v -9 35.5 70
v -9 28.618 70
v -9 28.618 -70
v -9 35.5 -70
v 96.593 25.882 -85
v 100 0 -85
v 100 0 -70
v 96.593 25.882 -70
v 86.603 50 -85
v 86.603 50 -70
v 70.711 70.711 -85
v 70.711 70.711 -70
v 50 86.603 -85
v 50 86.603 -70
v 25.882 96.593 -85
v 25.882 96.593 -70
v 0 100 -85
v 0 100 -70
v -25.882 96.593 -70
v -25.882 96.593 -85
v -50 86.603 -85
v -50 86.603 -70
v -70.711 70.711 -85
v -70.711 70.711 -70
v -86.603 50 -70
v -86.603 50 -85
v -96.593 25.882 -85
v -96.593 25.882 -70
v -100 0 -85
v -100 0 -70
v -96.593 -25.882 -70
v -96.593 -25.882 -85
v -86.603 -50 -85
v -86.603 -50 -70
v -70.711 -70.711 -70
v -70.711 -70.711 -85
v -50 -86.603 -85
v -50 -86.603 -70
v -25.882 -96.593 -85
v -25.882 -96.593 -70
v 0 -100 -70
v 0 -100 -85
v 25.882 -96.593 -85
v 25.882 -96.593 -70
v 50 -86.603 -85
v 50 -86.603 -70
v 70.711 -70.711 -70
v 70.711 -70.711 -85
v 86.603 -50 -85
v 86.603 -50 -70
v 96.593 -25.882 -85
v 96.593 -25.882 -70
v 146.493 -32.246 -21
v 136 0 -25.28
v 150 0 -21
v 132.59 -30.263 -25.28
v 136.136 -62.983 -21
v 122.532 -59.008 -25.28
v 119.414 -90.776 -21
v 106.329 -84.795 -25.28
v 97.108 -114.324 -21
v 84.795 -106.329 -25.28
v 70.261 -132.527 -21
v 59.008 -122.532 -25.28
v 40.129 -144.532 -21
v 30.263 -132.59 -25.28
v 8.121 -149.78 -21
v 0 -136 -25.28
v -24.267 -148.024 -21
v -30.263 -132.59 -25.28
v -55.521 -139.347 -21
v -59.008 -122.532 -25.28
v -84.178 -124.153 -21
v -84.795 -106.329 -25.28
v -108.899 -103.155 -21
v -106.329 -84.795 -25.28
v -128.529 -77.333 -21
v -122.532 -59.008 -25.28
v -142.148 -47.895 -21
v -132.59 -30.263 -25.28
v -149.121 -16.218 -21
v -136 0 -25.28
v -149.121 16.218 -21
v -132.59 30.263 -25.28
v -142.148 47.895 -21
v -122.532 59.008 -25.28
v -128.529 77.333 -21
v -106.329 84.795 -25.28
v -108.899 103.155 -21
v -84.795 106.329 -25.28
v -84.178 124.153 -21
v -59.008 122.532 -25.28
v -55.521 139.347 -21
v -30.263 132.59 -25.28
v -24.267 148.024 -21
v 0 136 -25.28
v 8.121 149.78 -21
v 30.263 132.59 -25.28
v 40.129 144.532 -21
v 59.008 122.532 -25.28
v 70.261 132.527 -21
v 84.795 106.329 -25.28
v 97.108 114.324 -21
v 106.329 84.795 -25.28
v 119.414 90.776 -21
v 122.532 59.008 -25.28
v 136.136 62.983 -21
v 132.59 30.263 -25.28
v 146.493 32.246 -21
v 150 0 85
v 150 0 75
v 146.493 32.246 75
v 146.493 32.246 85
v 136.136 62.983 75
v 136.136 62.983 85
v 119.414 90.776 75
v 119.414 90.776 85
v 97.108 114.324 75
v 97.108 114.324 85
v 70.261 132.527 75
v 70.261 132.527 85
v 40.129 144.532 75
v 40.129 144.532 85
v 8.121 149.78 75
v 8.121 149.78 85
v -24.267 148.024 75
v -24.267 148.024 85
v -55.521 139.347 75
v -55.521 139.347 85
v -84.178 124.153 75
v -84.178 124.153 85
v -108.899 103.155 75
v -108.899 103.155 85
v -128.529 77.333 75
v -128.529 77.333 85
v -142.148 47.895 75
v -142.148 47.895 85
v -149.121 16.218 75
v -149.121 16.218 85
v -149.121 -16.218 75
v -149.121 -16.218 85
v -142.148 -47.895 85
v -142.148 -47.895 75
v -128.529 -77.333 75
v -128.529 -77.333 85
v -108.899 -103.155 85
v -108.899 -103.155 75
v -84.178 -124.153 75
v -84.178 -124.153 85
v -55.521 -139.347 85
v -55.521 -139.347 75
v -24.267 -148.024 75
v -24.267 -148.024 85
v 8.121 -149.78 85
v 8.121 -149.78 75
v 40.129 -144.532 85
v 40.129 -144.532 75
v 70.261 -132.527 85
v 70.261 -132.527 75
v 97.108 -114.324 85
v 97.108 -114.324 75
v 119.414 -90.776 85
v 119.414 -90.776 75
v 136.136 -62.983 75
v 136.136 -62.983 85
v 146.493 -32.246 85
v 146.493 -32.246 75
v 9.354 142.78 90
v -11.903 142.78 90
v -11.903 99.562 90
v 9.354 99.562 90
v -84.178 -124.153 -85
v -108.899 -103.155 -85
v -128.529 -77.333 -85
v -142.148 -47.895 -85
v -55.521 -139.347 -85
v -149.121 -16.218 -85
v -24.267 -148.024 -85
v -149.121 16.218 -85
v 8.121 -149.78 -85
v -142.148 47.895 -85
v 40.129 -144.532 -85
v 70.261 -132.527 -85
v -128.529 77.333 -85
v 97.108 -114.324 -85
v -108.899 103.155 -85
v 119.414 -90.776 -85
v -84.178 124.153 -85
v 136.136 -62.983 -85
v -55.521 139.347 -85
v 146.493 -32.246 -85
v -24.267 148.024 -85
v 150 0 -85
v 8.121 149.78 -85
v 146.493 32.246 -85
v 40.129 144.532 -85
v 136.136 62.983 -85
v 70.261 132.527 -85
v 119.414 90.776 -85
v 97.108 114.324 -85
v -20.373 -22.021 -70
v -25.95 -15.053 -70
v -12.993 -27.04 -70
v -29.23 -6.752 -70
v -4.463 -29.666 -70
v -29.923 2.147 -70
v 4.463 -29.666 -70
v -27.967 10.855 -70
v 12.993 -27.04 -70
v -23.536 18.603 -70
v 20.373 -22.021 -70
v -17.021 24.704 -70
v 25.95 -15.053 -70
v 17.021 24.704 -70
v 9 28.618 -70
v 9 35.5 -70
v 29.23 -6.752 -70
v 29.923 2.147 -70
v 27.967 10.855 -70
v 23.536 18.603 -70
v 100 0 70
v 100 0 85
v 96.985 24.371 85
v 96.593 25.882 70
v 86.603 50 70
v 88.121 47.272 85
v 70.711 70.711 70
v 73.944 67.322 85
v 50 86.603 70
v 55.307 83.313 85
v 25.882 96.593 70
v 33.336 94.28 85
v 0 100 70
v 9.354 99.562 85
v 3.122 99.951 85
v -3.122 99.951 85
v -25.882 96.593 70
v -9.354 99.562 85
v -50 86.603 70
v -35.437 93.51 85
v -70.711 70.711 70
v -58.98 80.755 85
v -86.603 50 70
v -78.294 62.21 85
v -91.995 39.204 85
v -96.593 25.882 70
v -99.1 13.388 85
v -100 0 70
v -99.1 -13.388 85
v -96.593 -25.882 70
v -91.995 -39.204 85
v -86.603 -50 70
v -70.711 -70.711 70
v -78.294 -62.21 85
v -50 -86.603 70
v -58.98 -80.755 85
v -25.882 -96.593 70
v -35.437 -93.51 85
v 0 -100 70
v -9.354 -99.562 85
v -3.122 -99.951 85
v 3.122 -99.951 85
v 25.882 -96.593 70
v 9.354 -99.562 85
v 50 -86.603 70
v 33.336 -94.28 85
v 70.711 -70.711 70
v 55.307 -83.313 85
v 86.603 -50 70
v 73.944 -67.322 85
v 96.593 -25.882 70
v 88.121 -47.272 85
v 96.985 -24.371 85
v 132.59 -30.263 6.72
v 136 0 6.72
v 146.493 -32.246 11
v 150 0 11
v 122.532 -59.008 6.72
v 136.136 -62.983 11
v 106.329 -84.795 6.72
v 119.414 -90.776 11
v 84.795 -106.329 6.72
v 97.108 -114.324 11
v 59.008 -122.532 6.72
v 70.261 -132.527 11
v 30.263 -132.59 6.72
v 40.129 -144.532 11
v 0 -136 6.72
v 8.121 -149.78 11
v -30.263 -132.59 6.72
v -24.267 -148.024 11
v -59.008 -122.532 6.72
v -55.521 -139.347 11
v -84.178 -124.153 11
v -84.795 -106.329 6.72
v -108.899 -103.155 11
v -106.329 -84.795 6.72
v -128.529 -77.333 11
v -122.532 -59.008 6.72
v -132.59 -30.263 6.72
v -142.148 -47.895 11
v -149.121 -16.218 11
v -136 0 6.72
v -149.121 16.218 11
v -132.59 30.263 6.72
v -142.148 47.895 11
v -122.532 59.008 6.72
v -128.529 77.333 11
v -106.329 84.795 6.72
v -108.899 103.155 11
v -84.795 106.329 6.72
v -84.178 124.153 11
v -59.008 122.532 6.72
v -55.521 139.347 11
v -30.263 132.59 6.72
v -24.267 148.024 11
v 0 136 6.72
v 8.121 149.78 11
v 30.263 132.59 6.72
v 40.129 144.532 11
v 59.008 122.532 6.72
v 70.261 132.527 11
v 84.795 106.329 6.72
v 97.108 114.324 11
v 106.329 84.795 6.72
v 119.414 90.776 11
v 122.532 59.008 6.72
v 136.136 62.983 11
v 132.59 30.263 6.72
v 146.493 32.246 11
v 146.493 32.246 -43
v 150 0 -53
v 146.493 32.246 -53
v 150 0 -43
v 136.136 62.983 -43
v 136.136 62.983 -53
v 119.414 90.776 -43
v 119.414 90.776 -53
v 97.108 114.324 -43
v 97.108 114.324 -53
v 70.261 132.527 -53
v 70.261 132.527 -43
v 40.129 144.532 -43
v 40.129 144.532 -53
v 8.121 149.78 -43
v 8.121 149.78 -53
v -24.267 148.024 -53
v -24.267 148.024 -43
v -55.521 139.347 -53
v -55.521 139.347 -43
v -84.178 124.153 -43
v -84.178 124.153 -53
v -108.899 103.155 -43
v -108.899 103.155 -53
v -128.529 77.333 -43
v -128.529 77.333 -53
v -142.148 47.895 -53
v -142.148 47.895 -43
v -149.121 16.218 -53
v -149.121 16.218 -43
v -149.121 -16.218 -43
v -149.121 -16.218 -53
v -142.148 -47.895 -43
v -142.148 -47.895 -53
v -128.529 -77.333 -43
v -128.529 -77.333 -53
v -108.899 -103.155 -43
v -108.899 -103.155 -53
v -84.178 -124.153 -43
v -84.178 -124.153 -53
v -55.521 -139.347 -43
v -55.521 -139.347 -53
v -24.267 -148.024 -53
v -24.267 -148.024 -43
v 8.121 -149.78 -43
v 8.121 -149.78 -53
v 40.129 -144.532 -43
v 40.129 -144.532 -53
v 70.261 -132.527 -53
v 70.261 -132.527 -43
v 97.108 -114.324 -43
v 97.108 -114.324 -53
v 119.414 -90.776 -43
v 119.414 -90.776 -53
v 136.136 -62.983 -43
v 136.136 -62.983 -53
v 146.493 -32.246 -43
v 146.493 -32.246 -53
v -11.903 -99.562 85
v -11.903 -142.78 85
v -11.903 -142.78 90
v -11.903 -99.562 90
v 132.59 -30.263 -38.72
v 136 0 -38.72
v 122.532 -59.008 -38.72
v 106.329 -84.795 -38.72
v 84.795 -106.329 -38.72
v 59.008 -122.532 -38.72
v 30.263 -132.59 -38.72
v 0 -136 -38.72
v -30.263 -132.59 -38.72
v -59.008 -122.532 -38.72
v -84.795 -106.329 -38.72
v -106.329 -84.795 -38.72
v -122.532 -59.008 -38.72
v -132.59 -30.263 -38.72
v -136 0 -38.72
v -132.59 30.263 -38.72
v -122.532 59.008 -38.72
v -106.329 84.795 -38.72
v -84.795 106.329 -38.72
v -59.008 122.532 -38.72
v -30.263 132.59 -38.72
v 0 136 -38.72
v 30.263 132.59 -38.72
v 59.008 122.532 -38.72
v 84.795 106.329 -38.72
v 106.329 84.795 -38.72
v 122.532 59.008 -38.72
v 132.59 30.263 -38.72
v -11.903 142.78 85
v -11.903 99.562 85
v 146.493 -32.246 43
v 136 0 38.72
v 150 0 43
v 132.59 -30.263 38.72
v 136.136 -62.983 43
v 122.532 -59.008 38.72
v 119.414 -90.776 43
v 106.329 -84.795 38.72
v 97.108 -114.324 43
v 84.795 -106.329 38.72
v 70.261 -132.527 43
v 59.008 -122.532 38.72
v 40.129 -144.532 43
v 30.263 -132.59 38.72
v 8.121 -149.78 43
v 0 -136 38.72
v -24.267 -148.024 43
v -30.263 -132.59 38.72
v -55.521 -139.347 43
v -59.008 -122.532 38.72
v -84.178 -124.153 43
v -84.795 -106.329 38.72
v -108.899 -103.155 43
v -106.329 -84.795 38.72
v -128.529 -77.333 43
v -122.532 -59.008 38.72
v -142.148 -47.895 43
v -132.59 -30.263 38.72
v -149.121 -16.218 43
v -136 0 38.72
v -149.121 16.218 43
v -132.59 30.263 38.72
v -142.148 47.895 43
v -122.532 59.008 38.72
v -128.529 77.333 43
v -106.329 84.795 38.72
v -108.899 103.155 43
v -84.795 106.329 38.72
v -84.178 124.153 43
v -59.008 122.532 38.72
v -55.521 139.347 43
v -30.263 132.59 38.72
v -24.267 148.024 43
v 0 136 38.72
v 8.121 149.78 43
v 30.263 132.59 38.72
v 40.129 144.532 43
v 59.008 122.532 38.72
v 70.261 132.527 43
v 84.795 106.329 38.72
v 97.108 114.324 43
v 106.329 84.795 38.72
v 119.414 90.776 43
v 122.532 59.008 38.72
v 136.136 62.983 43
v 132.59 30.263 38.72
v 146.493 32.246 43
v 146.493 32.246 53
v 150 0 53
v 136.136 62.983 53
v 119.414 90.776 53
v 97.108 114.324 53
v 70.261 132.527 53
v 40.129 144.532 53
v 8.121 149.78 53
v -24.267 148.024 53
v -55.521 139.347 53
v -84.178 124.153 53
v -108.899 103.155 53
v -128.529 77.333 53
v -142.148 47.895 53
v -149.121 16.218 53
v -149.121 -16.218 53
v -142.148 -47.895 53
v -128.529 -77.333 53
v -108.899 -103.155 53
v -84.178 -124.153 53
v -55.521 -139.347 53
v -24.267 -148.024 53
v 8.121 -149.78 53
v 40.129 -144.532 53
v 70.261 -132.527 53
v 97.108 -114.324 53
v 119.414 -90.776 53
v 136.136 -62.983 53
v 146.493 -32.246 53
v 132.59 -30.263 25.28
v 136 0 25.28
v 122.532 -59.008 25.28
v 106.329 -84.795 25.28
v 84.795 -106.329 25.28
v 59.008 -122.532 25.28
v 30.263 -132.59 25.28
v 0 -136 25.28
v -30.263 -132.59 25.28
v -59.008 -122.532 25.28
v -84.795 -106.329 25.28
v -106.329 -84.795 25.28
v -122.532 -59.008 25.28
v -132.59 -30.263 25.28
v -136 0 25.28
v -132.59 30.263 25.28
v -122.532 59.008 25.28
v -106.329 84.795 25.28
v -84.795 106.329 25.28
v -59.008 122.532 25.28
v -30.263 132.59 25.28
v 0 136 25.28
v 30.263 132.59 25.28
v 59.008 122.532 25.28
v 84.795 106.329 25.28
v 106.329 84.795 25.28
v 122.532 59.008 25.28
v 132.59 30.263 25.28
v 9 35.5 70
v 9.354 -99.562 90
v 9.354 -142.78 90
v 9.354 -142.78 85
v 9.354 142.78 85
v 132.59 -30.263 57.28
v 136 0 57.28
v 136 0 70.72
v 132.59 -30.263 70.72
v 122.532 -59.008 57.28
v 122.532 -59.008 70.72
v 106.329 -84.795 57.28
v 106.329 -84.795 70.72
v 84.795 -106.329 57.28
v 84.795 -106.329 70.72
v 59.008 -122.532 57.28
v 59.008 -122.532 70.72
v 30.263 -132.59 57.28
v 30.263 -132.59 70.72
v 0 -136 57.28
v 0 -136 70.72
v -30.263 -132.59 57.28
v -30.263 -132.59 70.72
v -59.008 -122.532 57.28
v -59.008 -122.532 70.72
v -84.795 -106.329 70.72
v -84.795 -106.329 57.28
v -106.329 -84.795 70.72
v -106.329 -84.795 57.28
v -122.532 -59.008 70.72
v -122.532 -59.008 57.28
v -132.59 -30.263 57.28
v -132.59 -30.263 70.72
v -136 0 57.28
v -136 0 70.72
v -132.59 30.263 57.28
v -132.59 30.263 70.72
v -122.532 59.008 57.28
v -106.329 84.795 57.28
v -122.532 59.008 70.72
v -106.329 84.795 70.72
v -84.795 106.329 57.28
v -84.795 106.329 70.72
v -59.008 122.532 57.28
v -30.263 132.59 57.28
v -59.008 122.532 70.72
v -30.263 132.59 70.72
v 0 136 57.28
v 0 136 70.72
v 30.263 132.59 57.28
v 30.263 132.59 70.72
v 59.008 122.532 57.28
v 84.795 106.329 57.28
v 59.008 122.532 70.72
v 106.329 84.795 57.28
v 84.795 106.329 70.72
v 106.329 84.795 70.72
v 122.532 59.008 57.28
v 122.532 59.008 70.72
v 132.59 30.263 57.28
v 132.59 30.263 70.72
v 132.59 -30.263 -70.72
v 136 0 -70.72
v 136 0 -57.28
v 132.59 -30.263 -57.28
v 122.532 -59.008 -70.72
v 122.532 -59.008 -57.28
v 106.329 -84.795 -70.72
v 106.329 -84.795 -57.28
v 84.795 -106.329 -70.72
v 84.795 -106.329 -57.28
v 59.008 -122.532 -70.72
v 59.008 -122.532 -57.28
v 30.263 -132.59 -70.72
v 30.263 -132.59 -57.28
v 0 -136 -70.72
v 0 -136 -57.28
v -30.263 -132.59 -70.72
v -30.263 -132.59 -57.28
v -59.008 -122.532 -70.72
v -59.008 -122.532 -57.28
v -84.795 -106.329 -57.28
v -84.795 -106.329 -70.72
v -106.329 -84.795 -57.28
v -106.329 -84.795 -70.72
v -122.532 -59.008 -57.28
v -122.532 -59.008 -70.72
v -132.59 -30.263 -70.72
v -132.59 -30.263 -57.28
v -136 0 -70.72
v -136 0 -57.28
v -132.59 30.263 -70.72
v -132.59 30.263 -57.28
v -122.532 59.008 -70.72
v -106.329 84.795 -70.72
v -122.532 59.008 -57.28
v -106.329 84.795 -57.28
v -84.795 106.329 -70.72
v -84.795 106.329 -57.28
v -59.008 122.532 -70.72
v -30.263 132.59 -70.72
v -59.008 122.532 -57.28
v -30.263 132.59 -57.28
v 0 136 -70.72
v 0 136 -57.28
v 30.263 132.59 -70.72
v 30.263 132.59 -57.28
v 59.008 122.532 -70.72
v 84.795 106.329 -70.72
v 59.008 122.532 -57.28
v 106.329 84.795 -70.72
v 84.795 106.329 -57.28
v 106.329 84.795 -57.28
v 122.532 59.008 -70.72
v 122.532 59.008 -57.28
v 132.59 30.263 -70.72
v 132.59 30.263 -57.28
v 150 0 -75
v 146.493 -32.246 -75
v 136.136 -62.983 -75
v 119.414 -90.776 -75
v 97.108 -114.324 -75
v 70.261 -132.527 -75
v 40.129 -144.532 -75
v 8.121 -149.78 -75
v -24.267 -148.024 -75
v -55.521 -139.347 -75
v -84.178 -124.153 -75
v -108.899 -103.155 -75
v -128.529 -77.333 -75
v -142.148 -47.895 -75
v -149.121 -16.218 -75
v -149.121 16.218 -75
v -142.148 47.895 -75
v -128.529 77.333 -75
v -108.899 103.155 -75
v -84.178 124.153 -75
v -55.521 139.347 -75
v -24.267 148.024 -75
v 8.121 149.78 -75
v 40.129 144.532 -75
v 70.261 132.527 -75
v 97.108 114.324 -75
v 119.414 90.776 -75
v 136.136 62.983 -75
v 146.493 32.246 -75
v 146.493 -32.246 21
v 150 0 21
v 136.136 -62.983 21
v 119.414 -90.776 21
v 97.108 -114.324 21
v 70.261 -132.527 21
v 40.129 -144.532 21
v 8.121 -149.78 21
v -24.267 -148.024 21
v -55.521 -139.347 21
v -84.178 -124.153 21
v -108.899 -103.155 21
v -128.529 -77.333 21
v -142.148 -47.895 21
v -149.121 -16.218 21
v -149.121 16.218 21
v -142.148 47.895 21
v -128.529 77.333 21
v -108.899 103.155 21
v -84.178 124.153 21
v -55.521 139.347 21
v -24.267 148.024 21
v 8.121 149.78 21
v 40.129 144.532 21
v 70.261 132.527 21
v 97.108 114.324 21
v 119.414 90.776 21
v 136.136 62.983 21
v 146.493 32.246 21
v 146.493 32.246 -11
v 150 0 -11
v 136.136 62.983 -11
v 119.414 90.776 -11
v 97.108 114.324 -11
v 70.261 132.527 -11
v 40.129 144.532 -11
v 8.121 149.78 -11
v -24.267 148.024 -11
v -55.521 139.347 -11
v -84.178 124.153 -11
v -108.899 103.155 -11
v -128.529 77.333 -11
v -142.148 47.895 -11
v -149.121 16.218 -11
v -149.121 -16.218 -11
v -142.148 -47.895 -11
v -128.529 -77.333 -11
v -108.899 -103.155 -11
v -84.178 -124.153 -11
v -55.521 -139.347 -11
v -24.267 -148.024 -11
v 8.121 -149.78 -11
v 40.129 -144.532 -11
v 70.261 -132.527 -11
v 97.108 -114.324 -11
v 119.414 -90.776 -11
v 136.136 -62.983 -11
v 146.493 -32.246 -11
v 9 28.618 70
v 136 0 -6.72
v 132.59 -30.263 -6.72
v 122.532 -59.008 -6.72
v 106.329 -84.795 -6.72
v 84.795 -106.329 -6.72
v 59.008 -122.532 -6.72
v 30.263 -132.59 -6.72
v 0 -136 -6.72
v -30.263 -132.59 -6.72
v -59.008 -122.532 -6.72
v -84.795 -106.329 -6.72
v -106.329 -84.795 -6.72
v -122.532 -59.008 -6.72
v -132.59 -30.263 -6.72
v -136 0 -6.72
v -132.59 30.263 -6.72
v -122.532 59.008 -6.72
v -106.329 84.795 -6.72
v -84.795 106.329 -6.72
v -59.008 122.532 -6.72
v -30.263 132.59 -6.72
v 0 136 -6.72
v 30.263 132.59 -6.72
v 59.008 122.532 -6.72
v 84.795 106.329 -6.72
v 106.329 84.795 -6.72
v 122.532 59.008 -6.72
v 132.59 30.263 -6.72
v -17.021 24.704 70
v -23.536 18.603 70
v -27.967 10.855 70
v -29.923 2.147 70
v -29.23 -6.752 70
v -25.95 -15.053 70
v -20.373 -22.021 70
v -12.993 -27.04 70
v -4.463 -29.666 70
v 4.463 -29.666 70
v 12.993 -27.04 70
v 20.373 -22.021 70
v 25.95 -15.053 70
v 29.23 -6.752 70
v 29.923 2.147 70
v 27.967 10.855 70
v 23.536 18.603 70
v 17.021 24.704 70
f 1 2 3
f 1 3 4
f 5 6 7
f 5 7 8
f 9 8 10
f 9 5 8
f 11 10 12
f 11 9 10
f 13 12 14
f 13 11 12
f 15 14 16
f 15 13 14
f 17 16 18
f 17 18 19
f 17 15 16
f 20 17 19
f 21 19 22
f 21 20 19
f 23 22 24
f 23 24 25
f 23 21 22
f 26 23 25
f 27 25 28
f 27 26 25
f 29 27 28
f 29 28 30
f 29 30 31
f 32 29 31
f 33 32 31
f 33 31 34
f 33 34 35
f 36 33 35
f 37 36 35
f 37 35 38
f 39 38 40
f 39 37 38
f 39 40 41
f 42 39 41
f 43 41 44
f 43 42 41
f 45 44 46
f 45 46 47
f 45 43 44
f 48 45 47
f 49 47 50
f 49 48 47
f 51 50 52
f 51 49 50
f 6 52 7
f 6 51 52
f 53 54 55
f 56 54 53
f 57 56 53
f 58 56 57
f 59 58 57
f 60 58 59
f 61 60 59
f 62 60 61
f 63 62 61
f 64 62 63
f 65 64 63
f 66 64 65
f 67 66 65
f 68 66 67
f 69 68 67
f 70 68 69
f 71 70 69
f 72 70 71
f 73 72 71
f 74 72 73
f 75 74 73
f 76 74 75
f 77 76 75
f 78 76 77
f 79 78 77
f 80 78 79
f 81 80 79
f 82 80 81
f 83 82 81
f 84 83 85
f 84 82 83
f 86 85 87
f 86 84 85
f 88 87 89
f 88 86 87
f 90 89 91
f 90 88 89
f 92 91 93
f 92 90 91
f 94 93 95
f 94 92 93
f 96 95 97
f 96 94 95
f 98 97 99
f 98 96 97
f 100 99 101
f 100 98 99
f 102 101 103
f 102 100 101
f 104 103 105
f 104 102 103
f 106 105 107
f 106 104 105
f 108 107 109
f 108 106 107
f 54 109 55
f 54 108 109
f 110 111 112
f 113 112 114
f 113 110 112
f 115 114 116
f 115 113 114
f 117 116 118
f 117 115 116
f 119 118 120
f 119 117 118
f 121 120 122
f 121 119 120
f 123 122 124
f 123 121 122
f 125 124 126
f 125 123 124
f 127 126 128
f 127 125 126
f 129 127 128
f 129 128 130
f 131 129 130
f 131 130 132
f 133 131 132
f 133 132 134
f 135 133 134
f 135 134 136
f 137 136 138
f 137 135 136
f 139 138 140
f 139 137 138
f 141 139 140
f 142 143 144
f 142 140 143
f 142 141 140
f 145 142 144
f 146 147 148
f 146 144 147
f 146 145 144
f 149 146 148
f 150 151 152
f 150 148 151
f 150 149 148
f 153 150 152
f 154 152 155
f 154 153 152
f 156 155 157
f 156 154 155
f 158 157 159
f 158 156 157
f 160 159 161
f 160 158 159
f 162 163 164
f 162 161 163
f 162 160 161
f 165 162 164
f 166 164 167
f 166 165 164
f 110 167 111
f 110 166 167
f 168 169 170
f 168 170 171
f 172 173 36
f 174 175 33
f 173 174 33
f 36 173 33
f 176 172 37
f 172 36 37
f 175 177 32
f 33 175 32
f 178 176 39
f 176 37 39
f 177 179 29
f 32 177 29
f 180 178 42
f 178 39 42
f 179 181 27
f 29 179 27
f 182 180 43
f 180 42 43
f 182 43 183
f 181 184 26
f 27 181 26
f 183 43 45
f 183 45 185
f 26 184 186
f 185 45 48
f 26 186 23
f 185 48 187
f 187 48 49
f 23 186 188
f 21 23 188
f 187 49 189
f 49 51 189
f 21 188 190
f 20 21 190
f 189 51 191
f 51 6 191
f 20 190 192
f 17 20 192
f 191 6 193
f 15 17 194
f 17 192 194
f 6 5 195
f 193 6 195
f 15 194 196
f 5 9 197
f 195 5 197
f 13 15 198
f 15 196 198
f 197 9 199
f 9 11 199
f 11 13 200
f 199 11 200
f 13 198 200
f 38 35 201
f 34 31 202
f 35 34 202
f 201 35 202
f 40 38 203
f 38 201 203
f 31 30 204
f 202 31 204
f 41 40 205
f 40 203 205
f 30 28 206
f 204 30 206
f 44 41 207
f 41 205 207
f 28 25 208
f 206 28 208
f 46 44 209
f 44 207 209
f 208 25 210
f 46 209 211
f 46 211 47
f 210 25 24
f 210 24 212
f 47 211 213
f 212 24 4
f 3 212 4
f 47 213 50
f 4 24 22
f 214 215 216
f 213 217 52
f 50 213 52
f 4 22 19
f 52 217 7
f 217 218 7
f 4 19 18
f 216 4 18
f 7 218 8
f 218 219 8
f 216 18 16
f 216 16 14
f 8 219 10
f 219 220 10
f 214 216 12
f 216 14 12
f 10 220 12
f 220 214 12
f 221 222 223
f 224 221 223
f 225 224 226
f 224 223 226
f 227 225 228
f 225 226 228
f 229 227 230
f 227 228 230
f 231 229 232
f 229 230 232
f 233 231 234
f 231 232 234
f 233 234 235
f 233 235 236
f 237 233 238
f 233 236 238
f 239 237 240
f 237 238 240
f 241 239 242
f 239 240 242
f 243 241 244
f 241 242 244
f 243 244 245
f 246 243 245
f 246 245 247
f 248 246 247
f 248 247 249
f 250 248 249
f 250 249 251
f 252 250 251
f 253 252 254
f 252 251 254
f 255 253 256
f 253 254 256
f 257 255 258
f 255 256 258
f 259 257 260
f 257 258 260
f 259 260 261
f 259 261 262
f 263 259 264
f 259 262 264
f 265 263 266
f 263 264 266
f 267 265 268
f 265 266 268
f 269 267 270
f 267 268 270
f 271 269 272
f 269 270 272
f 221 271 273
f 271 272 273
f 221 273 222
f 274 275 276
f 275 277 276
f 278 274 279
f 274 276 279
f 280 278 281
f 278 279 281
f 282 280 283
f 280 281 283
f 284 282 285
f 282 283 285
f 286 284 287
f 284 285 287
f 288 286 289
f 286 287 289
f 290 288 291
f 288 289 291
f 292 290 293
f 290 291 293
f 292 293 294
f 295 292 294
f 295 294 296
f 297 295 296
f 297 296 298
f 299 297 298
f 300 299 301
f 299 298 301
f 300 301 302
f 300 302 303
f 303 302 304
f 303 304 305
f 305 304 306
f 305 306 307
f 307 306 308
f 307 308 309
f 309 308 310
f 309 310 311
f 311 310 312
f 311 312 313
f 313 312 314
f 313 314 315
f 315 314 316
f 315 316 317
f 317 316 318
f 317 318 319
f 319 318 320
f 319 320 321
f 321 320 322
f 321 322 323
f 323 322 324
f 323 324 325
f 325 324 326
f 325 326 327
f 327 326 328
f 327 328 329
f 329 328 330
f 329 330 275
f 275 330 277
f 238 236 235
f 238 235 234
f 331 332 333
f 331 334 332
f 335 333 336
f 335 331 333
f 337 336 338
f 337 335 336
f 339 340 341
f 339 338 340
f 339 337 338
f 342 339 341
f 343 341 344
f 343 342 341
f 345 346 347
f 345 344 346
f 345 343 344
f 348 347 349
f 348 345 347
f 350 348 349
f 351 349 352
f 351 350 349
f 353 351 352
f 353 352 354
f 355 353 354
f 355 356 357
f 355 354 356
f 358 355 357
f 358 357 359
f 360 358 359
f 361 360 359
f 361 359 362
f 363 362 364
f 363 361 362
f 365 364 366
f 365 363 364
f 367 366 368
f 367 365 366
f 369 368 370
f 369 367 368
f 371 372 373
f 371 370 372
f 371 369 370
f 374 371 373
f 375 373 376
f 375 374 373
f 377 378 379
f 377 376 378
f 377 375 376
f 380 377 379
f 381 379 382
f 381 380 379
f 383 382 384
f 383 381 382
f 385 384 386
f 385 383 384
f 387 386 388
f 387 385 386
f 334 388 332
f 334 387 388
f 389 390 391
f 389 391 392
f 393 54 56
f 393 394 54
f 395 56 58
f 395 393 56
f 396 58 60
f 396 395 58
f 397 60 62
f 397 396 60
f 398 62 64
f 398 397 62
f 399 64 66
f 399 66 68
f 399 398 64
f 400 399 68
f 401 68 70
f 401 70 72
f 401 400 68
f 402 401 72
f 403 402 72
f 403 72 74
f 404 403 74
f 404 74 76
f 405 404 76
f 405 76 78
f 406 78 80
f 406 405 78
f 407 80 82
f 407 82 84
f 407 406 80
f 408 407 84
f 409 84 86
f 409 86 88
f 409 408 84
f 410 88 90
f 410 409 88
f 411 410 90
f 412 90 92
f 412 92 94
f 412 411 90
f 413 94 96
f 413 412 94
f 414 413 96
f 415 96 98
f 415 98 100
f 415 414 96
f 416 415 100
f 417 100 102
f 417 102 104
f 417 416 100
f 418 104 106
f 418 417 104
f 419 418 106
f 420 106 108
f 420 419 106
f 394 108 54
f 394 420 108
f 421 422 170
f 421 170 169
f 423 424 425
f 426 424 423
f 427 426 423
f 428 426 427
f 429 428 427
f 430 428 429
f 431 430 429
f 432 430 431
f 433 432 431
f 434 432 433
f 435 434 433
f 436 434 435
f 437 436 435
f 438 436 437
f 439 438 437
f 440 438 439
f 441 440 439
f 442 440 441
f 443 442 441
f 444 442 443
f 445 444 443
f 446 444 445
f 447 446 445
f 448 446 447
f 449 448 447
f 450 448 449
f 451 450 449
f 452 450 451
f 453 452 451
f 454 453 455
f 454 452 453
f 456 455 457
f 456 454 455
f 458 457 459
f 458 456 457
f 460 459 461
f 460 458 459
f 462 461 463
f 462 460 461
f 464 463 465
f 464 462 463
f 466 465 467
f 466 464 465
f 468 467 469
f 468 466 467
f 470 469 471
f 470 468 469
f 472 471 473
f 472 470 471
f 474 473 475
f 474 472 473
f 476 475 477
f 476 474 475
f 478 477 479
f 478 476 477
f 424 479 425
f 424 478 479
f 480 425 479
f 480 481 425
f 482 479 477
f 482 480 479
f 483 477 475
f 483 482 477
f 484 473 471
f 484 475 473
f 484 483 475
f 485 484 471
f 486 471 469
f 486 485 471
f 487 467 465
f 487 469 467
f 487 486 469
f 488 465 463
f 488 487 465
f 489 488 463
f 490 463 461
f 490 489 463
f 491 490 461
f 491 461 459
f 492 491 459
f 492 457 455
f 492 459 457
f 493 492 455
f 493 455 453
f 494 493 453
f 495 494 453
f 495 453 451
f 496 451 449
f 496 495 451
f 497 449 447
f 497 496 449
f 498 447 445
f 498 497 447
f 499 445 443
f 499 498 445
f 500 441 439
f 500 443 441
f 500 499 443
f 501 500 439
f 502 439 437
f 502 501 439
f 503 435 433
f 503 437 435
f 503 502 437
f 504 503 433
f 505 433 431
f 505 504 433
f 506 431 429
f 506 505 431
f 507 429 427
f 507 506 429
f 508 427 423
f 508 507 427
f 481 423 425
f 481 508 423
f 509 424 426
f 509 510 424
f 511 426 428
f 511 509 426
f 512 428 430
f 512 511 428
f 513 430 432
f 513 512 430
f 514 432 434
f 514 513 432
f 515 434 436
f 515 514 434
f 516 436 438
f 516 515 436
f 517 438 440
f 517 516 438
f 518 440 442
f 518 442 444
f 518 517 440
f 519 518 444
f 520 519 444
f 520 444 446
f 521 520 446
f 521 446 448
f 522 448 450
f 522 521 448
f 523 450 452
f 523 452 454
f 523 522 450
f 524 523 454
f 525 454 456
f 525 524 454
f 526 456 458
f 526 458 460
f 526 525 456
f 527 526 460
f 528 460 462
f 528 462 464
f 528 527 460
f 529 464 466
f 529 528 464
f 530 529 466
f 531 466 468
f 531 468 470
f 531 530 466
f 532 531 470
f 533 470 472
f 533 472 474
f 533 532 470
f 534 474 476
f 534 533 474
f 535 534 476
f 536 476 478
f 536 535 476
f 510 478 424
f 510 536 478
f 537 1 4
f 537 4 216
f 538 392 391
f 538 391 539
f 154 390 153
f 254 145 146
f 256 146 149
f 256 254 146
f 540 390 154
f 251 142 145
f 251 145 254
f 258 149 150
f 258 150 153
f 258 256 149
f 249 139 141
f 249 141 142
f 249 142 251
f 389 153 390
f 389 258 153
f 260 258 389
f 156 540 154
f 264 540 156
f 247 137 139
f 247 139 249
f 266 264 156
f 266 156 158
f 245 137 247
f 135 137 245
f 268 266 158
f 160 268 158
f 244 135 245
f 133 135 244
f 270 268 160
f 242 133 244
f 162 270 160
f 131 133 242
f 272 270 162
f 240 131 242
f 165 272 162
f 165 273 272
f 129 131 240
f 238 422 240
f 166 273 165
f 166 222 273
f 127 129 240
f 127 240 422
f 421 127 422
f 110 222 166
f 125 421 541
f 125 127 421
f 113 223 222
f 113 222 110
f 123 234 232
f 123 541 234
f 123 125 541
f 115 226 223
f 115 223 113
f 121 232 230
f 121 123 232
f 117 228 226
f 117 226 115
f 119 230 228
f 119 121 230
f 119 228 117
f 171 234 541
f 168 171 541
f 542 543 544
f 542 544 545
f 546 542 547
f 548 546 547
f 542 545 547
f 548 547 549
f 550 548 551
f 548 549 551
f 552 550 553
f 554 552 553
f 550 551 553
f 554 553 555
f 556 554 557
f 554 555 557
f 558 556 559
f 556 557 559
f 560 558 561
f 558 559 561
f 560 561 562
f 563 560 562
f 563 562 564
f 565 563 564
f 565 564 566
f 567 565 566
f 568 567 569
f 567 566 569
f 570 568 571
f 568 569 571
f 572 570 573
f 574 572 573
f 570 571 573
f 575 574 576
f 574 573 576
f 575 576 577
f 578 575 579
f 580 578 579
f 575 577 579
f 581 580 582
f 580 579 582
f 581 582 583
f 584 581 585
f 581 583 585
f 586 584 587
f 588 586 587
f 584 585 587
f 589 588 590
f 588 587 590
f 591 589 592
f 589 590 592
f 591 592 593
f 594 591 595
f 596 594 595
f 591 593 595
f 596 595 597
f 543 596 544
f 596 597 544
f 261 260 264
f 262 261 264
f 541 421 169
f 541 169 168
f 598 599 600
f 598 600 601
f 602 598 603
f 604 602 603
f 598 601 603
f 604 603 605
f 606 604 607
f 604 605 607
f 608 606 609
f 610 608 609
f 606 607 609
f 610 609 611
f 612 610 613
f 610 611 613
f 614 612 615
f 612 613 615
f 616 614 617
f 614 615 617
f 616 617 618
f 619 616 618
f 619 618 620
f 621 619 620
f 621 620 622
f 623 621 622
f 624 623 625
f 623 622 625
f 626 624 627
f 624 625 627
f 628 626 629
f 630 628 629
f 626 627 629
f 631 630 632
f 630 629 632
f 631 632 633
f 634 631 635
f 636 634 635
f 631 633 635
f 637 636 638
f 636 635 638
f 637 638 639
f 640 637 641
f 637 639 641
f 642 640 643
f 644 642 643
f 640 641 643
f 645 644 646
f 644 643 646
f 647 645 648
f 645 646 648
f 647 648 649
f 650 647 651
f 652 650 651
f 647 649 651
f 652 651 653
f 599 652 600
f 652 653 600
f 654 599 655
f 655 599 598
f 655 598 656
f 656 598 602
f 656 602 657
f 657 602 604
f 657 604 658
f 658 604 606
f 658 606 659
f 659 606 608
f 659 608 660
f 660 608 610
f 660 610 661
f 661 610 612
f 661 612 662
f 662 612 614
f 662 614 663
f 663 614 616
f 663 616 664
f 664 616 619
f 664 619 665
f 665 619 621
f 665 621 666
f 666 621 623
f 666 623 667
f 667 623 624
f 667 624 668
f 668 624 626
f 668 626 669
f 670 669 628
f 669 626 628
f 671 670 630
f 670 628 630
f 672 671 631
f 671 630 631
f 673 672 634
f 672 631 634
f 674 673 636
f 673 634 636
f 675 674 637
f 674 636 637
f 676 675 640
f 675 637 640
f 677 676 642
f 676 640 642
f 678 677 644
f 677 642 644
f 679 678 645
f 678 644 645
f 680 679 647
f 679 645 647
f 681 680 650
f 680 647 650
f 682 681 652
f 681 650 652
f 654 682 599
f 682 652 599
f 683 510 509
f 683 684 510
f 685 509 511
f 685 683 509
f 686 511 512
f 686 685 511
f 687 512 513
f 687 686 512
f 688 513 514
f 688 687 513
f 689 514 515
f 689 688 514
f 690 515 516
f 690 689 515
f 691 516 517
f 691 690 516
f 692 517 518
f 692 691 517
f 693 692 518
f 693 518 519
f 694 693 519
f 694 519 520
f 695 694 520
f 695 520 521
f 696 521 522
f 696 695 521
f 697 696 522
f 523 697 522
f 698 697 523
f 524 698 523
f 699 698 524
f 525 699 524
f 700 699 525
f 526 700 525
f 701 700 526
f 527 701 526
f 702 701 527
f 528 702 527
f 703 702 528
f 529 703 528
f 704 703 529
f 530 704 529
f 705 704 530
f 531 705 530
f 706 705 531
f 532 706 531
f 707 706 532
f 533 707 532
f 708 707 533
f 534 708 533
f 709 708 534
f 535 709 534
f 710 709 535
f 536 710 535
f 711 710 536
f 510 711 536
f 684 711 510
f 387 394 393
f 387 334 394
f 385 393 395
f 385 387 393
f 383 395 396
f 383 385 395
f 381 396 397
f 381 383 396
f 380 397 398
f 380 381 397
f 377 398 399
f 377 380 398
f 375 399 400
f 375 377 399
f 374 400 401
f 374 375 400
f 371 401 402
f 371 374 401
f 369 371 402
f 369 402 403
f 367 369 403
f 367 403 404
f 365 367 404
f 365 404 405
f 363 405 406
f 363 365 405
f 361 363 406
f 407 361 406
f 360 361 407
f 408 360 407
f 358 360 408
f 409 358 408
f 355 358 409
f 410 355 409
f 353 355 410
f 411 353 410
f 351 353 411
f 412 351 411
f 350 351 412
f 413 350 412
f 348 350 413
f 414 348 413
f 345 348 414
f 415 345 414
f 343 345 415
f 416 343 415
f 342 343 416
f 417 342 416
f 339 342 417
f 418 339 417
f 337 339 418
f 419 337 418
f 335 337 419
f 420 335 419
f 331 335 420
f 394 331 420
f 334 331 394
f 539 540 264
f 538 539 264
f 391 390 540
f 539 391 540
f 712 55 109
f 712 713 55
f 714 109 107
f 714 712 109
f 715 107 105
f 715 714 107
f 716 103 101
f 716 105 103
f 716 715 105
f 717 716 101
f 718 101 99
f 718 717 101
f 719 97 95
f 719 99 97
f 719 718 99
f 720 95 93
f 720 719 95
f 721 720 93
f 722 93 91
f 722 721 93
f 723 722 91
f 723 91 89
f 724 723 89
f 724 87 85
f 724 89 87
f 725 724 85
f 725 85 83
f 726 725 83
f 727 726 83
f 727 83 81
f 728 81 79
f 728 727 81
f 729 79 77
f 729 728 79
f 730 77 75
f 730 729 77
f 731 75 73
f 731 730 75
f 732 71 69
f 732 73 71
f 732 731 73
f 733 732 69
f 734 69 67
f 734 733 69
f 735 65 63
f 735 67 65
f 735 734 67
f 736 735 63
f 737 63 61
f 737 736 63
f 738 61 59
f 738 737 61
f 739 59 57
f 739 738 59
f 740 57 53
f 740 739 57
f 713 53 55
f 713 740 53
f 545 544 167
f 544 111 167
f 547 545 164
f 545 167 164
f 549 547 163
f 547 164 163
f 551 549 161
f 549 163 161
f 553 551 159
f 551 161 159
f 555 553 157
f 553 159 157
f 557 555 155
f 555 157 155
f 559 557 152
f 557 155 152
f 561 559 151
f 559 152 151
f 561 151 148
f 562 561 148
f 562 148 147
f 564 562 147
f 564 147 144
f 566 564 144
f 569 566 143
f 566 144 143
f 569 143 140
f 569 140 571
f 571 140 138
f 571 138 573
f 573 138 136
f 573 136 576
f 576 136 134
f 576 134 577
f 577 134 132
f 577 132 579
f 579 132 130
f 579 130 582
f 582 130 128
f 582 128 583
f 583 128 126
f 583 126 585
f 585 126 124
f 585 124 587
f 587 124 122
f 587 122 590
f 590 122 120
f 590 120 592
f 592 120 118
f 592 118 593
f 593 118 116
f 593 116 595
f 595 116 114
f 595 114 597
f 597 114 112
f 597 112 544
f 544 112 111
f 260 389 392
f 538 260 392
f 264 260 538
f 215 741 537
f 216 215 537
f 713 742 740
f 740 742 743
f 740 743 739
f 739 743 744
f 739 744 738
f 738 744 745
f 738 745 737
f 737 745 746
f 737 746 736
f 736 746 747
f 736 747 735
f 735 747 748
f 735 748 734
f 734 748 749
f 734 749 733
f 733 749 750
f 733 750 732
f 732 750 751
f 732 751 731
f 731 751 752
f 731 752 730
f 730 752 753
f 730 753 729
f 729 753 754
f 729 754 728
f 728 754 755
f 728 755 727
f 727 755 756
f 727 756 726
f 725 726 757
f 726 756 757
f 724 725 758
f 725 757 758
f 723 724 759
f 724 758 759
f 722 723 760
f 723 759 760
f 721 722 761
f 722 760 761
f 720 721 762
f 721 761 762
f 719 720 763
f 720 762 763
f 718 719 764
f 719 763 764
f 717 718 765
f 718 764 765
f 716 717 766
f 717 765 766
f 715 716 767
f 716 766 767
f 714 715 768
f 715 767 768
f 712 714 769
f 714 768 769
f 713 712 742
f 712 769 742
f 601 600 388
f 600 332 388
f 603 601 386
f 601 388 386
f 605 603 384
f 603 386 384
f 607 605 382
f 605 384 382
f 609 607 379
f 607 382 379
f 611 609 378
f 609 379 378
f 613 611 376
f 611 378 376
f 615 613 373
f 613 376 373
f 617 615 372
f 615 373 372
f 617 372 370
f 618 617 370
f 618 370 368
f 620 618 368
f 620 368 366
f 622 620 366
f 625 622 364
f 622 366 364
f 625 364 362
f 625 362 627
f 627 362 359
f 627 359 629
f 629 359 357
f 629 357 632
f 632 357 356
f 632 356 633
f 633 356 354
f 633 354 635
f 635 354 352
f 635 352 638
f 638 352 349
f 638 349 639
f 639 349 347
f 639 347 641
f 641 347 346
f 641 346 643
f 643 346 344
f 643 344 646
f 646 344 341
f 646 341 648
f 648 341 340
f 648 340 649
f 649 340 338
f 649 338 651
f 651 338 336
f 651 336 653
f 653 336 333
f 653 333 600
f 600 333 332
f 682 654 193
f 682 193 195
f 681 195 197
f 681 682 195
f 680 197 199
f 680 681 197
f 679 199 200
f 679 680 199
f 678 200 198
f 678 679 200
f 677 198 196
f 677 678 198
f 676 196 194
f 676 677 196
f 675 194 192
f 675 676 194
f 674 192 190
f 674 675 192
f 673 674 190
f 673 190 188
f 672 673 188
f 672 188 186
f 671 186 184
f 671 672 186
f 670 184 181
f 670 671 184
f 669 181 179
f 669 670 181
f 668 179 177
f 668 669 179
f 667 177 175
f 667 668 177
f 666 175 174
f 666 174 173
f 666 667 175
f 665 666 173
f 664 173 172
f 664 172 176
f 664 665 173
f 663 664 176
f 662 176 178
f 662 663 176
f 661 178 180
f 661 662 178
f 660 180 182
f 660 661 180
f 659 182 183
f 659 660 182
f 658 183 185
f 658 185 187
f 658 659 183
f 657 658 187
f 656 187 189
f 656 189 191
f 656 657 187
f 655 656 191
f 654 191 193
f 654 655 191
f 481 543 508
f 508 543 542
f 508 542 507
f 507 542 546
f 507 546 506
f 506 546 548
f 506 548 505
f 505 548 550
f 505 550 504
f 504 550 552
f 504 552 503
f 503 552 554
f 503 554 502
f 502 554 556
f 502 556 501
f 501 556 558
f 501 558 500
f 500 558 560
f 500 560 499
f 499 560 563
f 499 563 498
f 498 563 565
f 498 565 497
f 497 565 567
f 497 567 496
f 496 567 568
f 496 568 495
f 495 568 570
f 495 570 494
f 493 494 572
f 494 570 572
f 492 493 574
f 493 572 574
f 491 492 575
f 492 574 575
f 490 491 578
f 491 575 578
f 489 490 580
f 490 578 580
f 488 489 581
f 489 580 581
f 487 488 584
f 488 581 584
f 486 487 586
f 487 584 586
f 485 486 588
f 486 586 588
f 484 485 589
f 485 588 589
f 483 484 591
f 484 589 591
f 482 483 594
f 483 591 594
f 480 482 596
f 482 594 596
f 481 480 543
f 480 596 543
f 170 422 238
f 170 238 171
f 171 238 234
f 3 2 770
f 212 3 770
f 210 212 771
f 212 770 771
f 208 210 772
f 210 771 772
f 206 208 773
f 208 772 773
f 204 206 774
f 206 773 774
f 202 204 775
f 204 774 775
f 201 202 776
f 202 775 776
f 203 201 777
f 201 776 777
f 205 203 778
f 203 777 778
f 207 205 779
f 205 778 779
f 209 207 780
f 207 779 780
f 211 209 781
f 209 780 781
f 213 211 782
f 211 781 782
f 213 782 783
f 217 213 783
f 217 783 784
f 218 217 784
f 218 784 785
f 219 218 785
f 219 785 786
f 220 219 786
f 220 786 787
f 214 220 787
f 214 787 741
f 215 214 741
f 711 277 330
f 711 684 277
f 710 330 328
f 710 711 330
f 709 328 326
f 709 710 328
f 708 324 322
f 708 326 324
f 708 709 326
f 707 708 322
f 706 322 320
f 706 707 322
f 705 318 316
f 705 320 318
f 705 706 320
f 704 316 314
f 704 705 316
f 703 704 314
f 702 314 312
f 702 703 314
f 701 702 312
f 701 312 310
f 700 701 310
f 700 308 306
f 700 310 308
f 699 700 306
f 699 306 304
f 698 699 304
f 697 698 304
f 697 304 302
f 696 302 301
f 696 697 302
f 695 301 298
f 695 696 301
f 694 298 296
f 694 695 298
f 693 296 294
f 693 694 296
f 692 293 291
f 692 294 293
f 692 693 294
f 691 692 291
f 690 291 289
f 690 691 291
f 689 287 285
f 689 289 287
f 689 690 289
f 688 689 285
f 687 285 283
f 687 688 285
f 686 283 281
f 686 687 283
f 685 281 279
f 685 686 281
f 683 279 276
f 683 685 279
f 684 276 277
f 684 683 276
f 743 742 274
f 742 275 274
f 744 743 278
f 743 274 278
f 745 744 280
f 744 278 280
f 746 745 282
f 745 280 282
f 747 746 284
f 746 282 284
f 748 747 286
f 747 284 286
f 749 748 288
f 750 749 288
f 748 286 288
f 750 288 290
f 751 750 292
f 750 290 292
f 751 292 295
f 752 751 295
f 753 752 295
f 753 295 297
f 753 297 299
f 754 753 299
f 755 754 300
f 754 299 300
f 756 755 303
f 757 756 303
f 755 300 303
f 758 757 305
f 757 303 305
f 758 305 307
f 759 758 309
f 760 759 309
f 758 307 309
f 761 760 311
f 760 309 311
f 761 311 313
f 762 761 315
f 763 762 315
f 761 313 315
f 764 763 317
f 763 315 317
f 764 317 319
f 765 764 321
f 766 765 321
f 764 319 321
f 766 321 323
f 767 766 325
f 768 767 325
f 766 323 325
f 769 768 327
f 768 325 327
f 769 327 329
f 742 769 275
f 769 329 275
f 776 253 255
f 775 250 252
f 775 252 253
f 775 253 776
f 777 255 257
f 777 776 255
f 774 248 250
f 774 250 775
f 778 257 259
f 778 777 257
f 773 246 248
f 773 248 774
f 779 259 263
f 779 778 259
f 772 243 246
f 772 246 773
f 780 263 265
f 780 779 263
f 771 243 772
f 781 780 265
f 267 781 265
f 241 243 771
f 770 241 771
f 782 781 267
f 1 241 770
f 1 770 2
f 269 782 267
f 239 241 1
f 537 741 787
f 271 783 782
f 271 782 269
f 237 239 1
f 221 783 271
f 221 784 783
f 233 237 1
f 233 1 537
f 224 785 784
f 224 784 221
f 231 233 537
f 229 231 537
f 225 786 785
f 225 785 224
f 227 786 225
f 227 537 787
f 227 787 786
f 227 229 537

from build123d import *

# Parameters (mm, degrees)
SKETCH1_R           = 150
BOSS_EXTRUDE1_DEPTH = 85
SKETCH3_R           = 30
CUT_EXTRUDE1_DEPTH  = 272.845544381
SKETCH4_R           = 100
SKETCH4_R_2         = 30
CUT_EXTRUDE2_DEPTH  = 15
SKETCH5_W           = 18
SKETCH5_H           = 11
CUT_EXTRUDE3_DEPTH  = 263.726093108
SKETCH10_W          = 21.256971554
SKETCH10_H          = 43.218095202
BOSS_EXTRUDE2_DEPTH = 5


with BuildPart() as part:
    # Sketch1 → Boss-Extrude1 (new, symmetric)
    with BuildSketch(Plane.XY):
        Circle(SKETCH1_R)
    extrude(amount=BOSS_EXTRUDE1_DEPTH, both=True)

    # Sketch3 → Cut-Extrude1 (cut, through all)
    with BuildSketch(Plane.XY.offset(85)):
        Circle(SKETCH3_R)
    extrude(amount=-CUT_EXTRUDE1_DEPTH, mode=Mode.SUBTRACT)

    # Sketch4 → Cut-Extrude2 (cut)
    with BuildSketch(Plane.XY.offset(85)):
        Circle(SKETCH4_R)
        Circle(SKETCH4_R_2, mode=Mode.SUBTRACT)
    cut_extrude2 = extrude(amount=-CUT_EXTRUDE2_DEPTH, mode=Mode.SUBTRACT)

    # Mirror1: Cut-Extrude2 across plane
    add(cut_extrude2.mirror(Plane.XY), mode=Mode.SUBTRACT)

    # Sketch5 → Cut-Extrude3 (cut, through all)
    with BuildSketch(Plane.XY.offset(70)):
        with Locations((0, 30)):
            Rectangle(SKETCH5_W, SKETCH5_H)
    extrude(amount=-CUT_EXTRUDE3_DEPTH, mode=Mode.SUBTRACT)

    # Sketch9 → Cut-Revolve2 (revolve, cut)
    with BuildSketch(Plane(origin=(0, 0, 0), x_dir=(1, 0, 0), z_dir=(0, 1, 0))):
        Polygon((150, 75), (136, 70.71977046), (136, 57.28022954), (150, 53), align=None)
        Polygon((150, 43), (150, 21), (136, 25.28022954), (136, 38.71977046), align=None)
        Polygon((150, 11), (136, 6.71977046), (136, -6.71977046), (150, -11), align=None)
        Polygon((150, -21), (150, -43), (136, -38.71977046), (136, -25.28022954), align=None)
        Polygon((150, -53), (136, -57.28022954), (136, -70.71977046), (150, -75), align=None)
    revolve(axis=Axis((0, 0, 0), (0, 0, -1)), mode=Mode.SUBTRACT)

    # Sketch10 → Boss-Extrude2 (add)
    with BuildSketch(Plane.XY.offset(85)):
        with Locations((-1.274543696, 121.17060528)):
            Rectangle(SKETCH10_W, SKETCH10_H)
        with Locations((-1.274543696, -121.17060528)):
            Rectangle(SKETCH10_W, SKETCH10_H)
    extrude(amount=BOSS_EXTRUDE2_DEPTH)


solid = part.part
